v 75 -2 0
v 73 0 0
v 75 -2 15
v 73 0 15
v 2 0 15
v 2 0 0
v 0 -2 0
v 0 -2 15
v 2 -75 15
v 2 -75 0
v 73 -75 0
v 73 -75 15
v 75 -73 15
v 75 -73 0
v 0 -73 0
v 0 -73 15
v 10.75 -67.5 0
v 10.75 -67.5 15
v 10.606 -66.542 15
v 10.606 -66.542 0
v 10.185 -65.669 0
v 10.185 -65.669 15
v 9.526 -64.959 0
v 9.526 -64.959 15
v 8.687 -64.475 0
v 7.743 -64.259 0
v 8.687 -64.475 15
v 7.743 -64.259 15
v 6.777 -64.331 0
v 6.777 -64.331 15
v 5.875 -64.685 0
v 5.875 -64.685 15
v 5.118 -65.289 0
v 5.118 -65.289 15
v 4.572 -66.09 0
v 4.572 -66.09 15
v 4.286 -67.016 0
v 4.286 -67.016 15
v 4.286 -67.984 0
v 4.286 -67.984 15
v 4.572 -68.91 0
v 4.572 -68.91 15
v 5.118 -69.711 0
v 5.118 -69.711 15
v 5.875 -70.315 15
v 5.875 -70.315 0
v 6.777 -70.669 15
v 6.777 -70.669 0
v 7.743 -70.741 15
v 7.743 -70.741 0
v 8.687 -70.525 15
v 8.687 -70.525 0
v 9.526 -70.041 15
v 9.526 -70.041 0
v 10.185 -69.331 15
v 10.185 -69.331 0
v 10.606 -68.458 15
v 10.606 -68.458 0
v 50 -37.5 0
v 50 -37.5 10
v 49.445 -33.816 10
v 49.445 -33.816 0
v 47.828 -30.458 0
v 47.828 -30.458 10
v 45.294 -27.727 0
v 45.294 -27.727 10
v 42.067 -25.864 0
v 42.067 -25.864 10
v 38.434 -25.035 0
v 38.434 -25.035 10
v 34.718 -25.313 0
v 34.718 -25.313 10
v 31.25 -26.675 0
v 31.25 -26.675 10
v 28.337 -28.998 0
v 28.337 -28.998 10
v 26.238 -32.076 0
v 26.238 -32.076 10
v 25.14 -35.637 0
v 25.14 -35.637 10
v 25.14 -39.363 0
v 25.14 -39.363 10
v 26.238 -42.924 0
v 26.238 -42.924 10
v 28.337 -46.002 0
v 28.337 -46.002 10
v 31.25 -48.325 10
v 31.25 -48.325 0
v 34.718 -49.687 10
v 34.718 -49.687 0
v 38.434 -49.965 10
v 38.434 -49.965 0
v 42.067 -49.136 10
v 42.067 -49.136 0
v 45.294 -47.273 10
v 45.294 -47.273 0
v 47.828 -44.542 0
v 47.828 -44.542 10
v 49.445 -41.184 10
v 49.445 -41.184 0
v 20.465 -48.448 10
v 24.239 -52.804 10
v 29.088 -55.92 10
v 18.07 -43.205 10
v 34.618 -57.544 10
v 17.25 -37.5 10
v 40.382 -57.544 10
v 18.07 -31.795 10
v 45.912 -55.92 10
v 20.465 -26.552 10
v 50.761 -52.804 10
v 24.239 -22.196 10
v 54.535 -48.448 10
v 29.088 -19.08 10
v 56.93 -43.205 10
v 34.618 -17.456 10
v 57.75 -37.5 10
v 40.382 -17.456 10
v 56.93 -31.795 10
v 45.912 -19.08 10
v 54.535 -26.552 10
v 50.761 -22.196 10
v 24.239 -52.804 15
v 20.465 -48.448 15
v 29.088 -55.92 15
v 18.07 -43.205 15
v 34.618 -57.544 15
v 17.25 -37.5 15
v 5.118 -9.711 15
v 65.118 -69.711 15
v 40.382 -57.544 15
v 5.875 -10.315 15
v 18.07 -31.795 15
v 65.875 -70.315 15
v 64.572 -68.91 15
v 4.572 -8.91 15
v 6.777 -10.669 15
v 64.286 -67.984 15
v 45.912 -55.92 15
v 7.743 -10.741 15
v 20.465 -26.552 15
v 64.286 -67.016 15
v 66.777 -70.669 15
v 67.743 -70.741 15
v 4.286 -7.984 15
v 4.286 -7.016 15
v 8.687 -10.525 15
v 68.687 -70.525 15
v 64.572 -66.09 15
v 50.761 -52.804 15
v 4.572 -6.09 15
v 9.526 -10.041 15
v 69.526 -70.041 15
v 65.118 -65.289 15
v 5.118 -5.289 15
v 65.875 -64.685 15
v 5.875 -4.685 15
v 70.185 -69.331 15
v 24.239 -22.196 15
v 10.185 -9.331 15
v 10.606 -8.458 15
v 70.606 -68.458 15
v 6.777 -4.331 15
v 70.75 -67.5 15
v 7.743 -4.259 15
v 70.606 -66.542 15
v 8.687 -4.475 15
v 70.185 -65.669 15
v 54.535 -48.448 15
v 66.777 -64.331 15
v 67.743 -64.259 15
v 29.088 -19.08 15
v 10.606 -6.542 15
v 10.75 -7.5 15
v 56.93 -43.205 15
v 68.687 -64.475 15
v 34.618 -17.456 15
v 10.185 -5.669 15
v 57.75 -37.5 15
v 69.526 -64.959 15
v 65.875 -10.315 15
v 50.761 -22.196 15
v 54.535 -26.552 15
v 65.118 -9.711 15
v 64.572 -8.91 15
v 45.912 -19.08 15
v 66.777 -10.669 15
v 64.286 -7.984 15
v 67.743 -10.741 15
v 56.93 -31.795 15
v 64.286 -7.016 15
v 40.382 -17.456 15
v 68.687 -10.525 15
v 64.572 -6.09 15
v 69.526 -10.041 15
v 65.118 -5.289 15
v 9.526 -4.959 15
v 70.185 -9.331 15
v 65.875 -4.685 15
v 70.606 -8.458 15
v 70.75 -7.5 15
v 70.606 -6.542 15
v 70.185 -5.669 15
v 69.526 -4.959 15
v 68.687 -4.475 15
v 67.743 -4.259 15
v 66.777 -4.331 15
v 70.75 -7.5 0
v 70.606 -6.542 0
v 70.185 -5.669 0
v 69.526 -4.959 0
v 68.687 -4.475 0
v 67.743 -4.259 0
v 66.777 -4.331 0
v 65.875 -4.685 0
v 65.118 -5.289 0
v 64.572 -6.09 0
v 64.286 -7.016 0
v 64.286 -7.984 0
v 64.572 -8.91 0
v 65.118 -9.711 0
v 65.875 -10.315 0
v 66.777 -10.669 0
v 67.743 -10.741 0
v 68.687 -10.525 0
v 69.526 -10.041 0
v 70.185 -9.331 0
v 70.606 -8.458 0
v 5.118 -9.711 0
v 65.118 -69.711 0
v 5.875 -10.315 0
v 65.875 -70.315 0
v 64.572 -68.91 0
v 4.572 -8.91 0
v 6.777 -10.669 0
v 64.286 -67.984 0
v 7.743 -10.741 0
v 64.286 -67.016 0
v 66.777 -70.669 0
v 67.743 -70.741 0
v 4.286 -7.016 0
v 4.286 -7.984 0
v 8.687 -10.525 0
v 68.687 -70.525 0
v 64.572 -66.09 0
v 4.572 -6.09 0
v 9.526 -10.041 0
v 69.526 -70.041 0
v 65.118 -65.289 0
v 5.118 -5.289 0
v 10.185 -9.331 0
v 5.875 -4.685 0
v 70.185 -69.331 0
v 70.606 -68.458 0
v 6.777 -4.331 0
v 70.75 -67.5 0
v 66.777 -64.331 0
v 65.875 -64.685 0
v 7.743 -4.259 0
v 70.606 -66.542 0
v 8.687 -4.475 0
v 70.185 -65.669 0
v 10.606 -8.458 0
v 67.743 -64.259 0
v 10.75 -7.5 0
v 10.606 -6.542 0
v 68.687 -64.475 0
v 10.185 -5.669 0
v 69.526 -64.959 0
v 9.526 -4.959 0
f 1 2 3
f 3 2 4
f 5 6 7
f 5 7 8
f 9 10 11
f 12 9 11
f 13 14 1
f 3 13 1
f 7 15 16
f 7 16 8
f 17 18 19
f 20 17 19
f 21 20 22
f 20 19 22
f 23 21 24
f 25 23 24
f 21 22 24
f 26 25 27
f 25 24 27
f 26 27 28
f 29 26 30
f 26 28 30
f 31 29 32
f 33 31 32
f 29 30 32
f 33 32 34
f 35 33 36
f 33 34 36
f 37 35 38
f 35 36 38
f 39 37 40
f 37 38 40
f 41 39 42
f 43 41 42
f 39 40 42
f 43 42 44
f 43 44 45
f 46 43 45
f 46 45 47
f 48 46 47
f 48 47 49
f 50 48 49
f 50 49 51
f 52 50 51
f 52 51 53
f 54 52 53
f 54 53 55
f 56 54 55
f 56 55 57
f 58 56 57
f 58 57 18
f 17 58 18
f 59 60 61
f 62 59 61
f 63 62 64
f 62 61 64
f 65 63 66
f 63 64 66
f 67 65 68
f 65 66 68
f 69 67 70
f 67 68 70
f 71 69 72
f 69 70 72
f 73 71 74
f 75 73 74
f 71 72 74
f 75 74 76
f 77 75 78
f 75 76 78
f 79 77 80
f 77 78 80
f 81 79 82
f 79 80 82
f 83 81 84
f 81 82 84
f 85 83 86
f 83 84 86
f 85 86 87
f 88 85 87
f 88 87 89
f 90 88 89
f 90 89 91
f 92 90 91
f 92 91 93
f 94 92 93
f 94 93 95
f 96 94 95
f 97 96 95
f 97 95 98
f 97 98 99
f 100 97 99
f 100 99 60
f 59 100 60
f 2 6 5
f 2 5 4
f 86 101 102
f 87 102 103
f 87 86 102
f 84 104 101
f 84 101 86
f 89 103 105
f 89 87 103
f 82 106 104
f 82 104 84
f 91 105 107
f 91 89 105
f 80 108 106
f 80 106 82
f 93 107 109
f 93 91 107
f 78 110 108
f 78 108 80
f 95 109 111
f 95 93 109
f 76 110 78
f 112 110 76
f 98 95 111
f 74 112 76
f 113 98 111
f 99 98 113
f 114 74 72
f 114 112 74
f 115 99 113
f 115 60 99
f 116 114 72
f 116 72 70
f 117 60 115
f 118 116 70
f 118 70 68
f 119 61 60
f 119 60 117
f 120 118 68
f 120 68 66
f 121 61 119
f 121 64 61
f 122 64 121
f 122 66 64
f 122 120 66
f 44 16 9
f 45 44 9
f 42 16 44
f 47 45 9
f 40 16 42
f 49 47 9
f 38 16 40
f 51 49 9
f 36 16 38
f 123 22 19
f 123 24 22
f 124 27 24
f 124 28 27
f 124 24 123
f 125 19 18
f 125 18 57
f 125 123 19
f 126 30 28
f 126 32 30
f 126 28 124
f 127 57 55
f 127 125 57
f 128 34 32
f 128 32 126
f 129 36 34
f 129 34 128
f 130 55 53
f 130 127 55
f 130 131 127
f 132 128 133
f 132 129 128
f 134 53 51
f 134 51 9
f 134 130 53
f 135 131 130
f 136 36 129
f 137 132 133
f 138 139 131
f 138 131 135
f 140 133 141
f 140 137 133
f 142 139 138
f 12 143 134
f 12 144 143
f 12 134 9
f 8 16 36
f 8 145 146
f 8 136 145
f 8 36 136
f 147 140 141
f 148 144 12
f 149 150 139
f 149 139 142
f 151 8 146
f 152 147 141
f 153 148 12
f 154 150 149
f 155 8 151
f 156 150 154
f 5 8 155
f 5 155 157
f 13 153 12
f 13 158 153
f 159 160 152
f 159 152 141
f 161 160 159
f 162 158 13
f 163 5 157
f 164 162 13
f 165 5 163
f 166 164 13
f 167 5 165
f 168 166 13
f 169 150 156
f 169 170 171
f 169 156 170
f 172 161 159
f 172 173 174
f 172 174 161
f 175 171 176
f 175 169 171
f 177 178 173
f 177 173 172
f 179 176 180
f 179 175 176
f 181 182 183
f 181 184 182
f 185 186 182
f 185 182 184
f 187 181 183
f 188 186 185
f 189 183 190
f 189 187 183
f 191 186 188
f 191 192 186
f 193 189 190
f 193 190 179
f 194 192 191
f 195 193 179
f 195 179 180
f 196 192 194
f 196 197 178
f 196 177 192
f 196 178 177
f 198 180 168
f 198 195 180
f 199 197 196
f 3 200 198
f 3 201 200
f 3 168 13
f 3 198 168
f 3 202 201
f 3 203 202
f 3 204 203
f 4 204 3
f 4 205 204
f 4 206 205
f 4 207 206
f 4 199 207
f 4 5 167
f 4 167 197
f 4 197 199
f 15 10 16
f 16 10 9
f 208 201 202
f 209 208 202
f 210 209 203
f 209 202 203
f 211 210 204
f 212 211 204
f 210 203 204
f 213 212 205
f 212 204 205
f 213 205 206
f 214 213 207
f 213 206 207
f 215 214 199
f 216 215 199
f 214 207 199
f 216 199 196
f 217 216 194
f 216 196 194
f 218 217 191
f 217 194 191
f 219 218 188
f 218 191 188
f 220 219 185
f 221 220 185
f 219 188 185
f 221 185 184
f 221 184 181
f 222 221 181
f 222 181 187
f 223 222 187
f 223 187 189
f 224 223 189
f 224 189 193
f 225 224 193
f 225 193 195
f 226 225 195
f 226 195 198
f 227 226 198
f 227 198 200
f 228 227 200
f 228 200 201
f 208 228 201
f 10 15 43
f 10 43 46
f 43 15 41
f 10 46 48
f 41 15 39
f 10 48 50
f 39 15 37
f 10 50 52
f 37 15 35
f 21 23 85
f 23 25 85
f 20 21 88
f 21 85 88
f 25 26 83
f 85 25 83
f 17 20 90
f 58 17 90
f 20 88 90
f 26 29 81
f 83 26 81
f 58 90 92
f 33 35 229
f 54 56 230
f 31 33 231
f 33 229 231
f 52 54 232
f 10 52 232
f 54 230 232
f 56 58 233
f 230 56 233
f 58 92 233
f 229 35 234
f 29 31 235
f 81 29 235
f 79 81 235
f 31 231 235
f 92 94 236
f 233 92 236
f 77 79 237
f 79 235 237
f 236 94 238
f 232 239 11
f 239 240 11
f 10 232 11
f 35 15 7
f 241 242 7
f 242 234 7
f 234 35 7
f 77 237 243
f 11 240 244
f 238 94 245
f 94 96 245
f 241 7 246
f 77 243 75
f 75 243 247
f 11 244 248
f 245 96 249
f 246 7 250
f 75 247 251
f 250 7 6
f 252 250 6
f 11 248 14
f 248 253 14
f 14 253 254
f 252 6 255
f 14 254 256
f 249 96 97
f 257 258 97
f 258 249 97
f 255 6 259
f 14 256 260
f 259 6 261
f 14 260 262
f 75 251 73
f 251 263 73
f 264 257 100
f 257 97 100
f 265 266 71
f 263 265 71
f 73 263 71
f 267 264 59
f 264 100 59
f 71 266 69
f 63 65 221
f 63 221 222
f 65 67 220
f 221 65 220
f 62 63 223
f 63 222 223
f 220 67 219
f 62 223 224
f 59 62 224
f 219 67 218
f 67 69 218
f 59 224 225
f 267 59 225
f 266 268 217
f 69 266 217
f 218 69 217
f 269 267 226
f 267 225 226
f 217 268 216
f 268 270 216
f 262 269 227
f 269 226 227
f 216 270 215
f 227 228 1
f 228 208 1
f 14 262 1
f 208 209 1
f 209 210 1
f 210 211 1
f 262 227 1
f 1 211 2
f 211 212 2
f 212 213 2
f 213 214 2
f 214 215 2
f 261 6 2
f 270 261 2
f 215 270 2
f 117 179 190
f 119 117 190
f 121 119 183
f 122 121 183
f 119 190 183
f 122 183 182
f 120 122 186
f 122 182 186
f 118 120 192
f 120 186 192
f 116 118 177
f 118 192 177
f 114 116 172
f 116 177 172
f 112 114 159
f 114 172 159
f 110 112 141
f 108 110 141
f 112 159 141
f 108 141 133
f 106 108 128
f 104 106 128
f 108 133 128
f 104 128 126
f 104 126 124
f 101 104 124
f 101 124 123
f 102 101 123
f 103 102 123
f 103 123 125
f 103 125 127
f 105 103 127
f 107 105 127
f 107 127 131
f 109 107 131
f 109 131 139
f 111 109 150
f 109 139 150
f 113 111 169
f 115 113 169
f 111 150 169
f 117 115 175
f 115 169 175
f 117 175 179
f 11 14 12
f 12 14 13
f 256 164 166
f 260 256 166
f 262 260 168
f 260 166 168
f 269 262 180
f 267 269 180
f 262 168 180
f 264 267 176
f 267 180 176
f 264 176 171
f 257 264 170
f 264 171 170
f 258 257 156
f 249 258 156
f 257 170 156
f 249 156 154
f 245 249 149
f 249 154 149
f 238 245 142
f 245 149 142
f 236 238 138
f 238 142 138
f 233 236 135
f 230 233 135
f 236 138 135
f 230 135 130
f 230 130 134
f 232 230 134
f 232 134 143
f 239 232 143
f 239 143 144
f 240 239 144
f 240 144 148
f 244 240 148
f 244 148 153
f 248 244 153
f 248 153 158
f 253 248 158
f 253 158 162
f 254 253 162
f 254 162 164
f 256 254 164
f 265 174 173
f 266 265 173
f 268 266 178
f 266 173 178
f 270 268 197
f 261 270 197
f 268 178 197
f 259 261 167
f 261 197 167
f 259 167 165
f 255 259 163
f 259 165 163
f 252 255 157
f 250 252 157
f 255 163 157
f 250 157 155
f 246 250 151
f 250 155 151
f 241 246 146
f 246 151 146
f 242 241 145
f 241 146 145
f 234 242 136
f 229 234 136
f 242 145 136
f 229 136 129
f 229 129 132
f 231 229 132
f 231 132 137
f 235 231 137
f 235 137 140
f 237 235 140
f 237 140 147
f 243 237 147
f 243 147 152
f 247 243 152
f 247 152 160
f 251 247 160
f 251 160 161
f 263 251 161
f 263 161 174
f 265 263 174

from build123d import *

# Parameters (mm, degrees)
SKETCH_1_W          = 75
SKETCH_1_H          = 75
EXTRUDE_1_DEPTH     = 15
CHAMFER_1_SIZE      = 2
SKETCH_2_R          = 12.5
SKETCH_2_R_2        = 3.25
CUT_EXTRUDE_1_DEPTH = 16
SKETCH_3_R          = 20.25
CUT_EXTRUDE_2_DEPTH = 5


with BuildPart() as part:
    # 草图1 → 凸台-拉伸1 (new body)
    with BuildSketch(Plane.XY):
        with Locations((37.5, -37.5)):
            Rectangle(SKETCH_1_W, SKETCH_1_H)
    extrude(amount=EXTRUDE_1_DEPTH)

    # 倒角1
    chamfer_1_edges = [part.edges().sort_by_distance(p)[0] for p in [
        (0, 0, 7.5),
        (75, 0, 7.5),
        (75, -75, 7.5),
        (0, -75, 7.5),
    ]]
    chamfer(chamfer_1_edges, length=CHAMFER_1_SIZE)

    # 草图2 → 切除-拉伸1 (cut, through all)
    with BuildSketch(Plane.XY.offset(15)):
        with Locations((37.5, -37.5)):
            Circle(SKETCH_2_R)
        with Locations((7.5, -7.5)):
            Circle(SKETCH_2_R_2)
        with Locations((67.5, -7.5)):
            Circle(SKETCH_2_R_2)
        with Locations((67.5, -67.5)):
            Circle(SKETCH_2_R_2)
        with Locations((7.5, -67.5)):
            Circle(SKETCH_2_R_2)
    extrude(amount=-CUT_EXTRUDE_1_DEPTH, mode=Mode.SUBTRACT)

    # 草图3 → 切除-拉伸2 (cut)
    with BuildSketch(Plane.XY.offset(15)):
        with Locations((37.5, -37.5)):
            Circle(SKETCH_3_R)
    extrude(amount=-CUT_EXTRUDE_2_DEPTH, mode=Mode.SUBTRACT)


solid = part.part
